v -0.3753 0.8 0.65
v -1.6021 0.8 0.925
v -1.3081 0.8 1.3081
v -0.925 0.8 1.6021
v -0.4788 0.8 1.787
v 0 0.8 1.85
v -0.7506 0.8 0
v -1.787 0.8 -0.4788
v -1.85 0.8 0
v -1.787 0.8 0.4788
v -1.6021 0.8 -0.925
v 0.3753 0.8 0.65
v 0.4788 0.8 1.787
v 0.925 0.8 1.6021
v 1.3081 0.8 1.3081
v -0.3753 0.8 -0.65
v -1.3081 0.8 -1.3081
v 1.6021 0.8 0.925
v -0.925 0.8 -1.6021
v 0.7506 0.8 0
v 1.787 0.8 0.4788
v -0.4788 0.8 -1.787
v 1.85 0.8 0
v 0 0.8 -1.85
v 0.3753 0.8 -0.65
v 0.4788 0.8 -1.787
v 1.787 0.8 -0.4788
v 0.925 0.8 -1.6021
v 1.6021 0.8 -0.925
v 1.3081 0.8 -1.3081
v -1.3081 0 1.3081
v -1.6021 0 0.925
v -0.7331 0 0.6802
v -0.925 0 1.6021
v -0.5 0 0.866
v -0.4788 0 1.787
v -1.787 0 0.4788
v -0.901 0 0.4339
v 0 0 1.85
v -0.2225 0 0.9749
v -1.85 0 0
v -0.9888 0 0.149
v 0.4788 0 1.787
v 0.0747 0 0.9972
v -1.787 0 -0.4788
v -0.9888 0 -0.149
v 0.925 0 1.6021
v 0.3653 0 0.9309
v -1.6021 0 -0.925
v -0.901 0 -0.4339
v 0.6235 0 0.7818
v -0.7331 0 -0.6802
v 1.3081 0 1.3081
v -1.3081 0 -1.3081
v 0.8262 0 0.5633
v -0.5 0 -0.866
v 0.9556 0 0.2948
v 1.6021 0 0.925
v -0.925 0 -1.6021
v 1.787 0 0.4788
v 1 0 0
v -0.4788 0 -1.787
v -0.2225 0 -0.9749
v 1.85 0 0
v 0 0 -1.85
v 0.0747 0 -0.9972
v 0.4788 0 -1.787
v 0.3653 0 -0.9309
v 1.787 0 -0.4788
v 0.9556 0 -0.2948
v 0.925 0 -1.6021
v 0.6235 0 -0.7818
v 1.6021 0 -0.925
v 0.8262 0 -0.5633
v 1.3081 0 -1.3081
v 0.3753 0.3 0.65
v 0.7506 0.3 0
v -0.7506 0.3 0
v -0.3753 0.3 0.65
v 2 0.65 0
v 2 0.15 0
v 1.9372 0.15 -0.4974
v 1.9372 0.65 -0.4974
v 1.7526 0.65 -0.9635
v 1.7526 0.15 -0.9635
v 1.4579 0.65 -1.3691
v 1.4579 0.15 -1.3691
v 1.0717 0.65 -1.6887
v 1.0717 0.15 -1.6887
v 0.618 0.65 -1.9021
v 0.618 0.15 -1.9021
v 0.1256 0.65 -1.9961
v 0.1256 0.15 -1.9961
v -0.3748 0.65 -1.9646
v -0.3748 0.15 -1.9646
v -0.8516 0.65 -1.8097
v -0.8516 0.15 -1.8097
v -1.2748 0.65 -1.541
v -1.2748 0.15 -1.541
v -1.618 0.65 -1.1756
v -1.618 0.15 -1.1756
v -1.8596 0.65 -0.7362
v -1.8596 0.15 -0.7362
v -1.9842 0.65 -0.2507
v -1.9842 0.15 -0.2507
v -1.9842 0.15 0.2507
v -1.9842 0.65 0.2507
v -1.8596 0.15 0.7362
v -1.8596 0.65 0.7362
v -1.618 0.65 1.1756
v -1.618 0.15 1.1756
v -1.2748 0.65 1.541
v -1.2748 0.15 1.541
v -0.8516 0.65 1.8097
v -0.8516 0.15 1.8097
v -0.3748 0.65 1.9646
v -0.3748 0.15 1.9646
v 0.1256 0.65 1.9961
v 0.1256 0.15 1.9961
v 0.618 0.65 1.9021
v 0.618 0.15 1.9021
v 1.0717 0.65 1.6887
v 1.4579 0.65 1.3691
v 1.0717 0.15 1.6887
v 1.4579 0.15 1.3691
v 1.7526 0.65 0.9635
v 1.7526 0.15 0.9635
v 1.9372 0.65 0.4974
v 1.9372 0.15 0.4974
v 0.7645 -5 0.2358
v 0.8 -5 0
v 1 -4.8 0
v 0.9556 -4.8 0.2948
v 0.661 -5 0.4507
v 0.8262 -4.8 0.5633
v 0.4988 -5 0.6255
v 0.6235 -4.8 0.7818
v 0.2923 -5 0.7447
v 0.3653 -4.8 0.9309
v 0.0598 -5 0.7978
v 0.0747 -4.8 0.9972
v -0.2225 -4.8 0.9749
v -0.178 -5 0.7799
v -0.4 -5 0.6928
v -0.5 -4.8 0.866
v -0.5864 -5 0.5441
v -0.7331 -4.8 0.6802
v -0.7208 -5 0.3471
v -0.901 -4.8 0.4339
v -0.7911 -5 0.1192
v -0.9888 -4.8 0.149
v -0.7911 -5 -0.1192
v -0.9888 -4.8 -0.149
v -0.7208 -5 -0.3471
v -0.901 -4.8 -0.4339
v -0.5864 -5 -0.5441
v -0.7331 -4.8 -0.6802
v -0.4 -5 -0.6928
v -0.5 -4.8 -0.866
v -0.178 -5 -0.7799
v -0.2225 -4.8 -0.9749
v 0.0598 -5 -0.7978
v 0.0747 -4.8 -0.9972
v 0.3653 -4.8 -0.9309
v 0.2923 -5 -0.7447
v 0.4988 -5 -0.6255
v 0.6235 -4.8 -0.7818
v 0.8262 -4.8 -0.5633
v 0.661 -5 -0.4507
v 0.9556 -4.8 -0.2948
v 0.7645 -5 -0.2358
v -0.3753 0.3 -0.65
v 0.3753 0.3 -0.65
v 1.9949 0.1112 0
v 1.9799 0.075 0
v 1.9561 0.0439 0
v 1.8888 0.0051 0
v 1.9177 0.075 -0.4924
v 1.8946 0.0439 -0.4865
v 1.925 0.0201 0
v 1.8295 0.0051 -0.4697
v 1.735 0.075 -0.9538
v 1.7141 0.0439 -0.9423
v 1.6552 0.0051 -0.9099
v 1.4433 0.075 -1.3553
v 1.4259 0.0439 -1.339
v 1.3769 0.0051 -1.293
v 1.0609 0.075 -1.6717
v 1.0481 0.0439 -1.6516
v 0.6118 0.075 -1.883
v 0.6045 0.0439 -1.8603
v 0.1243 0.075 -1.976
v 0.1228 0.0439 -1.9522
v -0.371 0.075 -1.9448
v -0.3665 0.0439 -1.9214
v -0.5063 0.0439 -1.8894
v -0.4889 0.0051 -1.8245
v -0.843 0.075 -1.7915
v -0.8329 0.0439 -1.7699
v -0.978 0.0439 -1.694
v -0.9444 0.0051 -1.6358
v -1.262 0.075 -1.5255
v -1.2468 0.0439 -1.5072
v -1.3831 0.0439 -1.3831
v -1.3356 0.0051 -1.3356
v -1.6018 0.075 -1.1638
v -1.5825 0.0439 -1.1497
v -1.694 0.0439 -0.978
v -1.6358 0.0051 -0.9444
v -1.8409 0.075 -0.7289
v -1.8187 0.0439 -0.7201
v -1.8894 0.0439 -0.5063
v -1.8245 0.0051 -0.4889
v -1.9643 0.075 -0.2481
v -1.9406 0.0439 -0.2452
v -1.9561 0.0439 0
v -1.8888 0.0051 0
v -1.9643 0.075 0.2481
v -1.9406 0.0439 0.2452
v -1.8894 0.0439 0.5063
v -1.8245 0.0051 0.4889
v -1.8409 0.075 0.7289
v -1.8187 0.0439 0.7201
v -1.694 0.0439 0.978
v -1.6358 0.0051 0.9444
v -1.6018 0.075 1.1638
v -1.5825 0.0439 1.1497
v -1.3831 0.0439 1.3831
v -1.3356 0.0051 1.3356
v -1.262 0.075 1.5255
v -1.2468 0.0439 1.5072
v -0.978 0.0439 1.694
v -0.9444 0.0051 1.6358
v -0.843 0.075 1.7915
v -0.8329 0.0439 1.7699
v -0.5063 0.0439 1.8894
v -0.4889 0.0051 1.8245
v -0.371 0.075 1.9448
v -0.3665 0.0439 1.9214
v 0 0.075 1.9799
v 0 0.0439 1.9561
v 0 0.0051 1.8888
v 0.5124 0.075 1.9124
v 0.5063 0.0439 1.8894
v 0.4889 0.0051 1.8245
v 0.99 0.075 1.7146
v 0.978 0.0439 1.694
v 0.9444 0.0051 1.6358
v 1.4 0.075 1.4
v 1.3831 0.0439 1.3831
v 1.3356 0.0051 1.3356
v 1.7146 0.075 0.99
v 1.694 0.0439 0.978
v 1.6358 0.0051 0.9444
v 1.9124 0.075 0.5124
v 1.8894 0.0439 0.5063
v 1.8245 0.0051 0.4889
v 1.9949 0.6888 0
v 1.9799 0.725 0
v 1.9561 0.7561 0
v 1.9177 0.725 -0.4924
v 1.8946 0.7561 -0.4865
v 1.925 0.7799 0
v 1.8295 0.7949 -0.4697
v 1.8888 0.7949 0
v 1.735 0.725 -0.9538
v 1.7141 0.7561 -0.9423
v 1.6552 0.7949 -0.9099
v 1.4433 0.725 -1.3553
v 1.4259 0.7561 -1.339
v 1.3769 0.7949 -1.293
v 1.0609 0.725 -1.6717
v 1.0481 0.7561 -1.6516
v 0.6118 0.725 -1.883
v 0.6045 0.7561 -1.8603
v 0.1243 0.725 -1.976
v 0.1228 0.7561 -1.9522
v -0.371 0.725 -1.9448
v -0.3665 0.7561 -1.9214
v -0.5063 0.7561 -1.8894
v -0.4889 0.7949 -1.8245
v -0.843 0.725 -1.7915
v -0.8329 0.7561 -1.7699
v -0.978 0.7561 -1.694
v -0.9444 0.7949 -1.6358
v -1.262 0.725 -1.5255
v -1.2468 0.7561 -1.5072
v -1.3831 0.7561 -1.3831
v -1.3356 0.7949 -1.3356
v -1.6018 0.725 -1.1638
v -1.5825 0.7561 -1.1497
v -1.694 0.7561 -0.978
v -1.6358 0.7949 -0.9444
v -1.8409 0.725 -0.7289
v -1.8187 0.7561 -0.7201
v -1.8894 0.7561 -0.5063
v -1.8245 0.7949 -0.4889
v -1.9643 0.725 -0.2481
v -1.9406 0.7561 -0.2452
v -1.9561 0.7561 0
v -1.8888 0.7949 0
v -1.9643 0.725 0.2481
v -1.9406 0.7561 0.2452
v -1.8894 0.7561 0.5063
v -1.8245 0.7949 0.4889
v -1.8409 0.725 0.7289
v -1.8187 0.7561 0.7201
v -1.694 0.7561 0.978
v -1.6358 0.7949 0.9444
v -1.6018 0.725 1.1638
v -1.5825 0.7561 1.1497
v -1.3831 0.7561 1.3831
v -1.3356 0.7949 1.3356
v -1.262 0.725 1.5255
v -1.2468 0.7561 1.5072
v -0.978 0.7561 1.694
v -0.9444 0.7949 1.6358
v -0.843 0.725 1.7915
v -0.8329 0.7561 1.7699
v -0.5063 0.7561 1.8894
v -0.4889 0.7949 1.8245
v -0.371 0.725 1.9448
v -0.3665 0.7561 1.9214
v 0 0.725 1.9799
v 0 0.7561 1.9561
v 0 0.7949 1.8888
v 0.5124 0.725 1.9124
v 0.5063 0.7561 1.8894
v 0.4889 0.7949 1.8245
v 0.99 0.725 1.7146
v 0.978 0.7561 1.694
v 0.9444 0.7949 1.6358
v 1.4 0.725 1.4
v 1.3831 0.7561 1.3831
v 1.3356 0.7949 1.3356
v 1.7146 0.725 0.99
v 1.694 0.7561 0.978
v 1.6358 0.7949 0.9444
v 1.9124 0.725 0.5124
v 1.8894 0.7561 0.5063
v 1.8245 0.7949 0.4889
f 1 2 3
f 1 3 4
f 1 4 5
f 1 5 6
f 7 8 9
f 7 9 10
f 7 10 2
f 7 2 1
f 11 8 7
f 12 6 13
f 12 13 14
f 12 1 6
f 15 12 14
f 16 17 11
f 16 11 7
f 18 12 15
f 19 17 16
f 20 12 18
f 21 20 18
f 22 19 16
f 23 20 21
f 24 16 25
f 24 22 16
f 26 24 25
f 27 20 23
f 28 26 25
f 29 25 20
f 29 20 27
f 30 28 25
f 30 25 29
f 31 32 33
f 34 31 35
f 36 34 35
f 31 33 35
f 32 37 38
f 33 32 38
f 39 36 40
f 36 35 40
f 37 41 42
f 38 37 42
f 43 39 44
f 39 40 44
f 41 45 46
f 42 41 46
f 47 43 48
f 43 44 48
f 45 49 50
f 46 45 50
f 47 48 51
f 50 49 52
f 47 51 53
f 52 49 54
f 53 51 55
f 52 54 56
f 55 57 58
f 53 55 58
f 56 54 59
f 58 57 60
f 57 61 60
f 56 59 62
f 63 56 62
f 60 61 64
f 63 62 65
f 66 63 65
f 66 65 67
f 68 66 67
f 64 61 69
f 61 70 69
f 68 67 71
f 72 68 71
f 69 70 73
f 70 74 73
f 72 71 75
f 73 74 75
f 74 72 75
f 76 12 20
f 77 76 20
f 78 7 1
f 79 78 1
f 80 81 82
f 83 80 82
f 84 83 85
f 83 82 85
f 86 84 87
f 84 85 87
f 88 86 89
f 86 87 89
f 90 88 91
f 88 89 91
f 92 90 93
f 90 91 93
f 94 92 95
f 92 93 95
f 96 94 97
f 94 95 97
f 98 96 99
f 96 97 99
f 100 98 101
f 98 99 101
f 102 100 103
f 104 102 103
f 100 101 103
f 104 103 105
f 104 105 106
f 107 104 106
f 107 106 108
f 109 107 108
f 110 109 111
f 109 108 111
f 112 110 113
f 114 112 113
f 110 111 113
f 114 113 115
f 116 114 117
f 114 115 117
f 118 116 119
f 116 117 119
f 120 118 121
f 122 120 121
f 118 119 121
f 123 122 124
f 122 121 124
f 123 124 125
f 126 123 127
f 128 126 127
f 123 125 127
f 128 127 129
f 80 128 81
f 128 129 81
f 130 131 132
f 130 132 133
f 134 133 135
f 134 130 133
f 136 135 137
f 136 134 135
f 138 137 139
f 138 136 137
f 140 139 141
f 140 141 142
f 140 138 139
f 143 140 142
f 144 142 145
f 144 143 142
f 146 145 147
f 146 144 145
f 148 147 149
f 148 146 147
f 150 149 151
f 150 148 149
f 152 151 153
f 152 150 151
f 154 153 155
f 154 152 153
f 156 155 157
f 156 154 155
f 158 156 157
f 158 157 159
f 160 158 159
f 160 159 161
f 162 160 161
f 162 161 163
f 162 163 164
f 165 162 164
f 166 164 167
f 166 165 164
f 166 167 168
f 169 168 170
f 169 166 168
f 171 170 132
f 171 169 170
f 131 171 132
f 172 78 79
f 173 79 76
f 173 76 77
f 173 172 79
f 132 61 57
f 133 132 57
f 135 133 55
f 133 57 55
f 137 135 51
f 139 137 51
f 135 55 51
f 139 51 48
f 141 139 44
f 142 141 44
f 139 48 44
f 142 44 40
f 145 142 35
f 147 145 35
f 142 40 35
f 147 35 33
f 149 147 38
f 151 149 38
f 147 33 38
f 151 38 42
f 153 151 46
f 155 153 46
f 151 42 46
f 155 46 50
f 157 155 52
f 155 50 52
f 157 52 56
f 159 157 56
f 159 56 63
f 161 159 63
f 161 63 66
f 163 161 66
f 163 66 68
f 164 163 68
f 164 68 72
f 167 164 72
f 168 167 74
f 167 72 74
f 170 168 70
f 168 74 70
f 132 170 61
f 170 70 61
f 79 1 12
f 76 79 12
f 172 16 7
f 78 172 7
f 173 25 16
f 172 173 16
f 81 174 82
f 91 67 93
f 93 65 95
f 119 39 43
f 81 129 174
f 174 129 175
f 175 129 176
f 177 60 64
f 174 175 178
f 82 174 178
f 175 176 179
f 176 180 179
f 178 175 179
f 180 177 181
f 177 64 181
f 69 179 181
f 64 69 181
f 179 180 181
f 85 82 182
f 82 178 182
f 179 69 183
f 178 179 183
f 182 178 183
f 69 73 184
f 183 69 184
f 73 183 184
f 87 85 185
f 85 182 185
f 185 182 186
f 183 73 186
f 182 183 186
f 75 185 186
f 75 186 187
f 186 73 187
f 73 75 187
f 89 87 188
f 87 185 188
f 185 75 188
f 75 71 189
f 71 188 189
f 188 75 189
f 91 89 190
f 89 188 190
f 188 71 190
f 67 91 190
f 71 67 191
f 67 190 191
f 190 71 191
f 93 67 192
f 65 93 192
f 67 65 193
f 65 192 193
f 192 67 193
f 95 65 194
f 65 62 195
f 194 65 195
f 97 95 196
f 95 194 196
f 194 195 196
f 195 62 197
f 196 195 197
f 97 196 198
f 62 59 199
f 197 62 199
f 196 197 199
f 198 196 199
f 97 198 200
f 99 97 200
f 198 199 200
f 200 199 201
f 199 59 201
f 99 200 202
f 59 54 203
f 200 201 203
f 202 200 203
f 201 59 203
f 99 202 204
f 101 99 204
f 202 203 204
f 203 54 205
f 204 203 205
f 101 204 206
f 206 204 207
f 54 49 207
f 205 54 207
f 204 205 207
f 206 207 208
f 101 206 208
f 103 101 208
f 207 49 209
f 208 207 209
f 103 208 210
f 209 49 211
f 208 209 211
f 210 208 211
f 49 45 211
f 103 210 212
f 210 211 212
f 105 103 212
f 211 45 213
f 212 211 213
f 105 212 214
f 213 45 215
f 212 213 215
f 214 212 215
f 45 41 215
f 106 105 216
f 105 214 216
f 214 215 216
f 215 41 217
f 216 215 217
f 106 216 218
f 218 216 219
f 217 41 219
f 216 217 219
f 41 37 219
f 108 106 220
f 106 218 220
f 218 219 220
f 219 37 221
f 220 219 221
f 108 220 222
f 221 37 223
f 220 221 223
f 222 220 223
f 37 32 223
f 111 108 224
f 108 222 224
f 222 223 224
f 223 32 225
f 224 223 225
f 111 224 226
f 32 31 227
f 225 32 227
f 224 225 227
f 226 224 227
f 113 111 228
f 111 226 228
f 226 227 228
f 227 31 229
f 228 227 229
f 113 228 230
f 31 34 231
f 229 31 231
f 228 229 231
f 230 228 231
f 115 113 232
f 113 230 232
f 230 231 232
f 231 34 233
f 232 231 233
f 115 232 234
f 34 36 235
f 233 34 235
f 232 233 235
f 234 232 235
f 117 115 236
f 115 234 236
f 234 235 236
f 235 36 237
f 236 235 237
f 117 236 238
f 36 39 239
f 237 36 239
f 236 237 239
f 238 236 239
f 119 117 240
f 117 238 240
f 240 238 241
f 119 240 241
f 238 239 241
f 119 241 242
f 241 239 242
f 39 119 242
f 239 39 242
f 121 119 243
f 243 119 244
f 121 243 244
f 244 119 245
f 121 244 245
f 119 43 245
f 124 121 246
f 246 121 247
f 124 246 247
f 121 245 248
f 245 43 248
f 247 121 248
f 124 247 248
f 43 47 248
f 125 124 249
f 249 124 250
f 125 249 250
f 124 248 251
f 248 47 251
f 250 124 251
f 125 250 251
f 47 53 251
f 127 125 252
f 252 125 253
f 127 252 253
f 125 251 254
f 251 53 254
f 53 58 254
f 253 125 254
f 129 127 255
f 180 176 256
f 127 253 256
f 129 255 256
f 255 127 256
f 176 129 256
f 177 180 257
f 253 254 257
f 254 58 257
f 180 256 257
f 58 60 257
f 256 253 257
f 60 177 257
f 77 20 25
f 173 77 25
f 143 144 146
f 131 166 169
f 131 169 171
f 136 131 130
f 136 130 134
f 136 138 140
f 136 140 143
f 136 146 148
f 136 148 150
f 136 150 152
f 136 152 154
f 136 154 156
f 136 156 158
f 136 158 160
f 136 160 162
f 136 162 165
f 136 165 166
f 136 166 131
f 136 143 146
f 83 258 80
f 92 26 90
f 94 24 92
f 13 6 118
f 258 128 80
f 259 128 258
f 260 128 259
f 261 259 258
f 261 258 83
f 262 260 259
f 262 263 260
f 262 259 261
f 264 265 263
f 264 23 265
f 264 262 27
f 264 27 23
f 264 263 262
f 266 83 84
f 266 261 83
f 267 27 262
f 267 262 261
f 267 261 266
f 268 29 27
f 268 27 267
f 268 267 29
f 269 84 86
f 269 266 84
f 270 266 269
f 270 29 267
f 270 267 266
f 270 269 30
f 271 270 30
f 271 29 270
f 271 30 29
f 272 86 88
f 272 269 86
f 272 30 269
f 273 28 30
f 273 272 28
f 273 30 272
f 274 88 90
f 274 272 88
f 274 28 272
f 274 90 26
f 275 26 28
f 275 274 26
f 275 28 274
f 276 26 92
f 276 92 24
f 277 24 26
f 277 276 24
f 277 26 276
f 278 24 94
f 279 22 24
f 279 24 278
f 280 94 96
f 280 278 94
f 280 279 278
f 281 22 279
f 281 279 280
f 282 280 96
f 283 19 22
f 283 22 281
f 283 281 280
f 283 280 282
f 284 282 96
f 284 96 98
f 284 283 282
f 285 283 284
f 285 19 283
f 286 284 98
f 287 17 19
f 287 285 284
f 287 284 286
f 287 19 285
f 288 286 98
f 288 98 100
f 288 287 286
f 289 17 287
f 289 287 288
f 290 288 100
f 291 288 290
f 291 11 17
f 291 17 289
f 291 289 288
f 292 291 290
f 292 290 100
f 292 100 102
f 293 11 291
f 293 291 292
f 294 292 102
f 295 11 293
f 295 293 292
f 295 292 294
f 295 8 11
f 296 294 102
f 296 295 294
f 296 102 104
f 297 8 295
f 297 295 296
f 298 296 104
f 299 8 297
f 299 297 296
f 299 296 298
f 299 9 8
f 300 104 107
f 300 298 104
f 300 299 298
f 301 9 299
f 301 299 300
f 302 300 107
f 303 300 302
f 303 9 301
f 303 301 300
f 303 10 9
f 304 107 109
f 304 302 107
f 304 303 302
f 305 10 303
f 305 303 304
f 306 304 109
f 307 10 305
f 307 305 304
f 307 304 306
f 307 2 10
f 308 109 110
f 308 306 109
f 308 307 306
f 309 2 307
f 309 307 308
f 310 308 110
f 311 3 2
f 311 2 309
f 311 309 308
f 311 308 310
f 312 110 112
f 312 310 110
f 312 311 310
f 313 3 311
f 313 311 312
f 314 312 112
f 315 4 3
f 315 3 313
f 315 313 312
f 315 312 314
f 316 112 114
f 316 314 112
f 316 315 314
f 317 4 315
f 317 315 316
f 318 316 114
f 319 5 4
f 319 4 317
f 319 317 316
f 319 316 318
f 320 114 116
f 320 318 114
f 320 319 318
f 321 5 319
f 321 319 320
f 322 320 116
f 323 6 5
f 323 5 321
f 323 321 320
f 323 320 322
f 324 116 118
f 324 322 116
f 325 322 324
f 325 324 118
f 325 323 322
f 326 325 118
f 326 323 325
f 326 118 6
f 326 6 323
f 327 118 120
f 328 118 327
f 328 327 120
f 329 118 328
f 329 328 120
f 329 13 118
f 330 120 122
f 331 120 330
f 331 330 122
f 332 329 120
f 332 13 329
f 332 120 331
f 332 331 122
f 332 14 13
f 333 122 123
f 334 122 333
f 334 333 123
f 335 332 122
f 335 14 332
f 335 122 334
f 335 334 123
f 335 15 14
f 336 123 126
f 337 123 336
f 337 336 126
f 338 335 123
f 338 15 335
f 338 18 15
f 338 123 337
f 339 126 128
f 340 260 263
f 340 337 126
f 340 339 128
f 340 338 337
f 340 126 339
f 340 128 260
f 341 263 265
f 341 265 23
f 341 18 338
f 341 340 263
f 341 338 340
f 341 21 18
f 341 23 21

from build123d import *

# Parameters (mm, degrees)
SKETCH_1_R          = 2
EXTRUDE_1_DEPTH     = 0.8
SKETCH_2_R          = 1
EXTRUDE_2_DEPTH     = 5
FILLET_1_R          = 0.15
CHAMFER_1_SIZE      = 0.2
CUT_EXTRUDE_1_DEPTH = 0.5


with BuildPart() as part:
    # 草图1 → 凸台-拉伸1 (new body)
    with BuildSketch(Plane(origin=(0, 0, 0), x_dir=(1, 0, 0), z_dir=(0, 1, 0))):
        Circle(SKETCH_1_R)
    extrude(amount=EXTRUDE_1_DEPTH)

    # 草图2 → 凸台-拉伸2 (add)
    with BuildSketch(Plane.XZ):
        Circle(SKETCH_2_R)
    extrude(amount=EXTRUDE_2_DEPTH)

    # 圆角1
    fillet_1_edges = [part.edges().sort_by_distance(p)[0] for p in [
        (-2, 0, 0),
        (-2, 0.8, 0),
    ]]
    fillet(fillet_1_edges, radius=FILLET_1_R)

    # 倒角1
    chamfer_1_edges = [part.edges().sort_by_distance(p)[0] for p in [
        (-1, -5, 0),
    ]]
    chamfer(chamfer_1_edges, length=CHAMFER_1_SIZE)

    # 草图3 → 切除-拉伸1 (cut)
    with BuildSketch(Plane(origin=(0, 0.8, 0), x_dir=(1, 0, 0), z_dir=(0, 1, 0))):
        Polygon((0.75055535, 0), (0.375277675, 0.65), (-0.375277675, 0.65), (-0.75055535, 0), (-0.375277675, -0.65), (0.375277675, -0.65), align=None)
    extrude(amount=-CUT_EXTRUDE_1_DEPTH, mode=Mode.SUBTRACT)


solid = part.part
